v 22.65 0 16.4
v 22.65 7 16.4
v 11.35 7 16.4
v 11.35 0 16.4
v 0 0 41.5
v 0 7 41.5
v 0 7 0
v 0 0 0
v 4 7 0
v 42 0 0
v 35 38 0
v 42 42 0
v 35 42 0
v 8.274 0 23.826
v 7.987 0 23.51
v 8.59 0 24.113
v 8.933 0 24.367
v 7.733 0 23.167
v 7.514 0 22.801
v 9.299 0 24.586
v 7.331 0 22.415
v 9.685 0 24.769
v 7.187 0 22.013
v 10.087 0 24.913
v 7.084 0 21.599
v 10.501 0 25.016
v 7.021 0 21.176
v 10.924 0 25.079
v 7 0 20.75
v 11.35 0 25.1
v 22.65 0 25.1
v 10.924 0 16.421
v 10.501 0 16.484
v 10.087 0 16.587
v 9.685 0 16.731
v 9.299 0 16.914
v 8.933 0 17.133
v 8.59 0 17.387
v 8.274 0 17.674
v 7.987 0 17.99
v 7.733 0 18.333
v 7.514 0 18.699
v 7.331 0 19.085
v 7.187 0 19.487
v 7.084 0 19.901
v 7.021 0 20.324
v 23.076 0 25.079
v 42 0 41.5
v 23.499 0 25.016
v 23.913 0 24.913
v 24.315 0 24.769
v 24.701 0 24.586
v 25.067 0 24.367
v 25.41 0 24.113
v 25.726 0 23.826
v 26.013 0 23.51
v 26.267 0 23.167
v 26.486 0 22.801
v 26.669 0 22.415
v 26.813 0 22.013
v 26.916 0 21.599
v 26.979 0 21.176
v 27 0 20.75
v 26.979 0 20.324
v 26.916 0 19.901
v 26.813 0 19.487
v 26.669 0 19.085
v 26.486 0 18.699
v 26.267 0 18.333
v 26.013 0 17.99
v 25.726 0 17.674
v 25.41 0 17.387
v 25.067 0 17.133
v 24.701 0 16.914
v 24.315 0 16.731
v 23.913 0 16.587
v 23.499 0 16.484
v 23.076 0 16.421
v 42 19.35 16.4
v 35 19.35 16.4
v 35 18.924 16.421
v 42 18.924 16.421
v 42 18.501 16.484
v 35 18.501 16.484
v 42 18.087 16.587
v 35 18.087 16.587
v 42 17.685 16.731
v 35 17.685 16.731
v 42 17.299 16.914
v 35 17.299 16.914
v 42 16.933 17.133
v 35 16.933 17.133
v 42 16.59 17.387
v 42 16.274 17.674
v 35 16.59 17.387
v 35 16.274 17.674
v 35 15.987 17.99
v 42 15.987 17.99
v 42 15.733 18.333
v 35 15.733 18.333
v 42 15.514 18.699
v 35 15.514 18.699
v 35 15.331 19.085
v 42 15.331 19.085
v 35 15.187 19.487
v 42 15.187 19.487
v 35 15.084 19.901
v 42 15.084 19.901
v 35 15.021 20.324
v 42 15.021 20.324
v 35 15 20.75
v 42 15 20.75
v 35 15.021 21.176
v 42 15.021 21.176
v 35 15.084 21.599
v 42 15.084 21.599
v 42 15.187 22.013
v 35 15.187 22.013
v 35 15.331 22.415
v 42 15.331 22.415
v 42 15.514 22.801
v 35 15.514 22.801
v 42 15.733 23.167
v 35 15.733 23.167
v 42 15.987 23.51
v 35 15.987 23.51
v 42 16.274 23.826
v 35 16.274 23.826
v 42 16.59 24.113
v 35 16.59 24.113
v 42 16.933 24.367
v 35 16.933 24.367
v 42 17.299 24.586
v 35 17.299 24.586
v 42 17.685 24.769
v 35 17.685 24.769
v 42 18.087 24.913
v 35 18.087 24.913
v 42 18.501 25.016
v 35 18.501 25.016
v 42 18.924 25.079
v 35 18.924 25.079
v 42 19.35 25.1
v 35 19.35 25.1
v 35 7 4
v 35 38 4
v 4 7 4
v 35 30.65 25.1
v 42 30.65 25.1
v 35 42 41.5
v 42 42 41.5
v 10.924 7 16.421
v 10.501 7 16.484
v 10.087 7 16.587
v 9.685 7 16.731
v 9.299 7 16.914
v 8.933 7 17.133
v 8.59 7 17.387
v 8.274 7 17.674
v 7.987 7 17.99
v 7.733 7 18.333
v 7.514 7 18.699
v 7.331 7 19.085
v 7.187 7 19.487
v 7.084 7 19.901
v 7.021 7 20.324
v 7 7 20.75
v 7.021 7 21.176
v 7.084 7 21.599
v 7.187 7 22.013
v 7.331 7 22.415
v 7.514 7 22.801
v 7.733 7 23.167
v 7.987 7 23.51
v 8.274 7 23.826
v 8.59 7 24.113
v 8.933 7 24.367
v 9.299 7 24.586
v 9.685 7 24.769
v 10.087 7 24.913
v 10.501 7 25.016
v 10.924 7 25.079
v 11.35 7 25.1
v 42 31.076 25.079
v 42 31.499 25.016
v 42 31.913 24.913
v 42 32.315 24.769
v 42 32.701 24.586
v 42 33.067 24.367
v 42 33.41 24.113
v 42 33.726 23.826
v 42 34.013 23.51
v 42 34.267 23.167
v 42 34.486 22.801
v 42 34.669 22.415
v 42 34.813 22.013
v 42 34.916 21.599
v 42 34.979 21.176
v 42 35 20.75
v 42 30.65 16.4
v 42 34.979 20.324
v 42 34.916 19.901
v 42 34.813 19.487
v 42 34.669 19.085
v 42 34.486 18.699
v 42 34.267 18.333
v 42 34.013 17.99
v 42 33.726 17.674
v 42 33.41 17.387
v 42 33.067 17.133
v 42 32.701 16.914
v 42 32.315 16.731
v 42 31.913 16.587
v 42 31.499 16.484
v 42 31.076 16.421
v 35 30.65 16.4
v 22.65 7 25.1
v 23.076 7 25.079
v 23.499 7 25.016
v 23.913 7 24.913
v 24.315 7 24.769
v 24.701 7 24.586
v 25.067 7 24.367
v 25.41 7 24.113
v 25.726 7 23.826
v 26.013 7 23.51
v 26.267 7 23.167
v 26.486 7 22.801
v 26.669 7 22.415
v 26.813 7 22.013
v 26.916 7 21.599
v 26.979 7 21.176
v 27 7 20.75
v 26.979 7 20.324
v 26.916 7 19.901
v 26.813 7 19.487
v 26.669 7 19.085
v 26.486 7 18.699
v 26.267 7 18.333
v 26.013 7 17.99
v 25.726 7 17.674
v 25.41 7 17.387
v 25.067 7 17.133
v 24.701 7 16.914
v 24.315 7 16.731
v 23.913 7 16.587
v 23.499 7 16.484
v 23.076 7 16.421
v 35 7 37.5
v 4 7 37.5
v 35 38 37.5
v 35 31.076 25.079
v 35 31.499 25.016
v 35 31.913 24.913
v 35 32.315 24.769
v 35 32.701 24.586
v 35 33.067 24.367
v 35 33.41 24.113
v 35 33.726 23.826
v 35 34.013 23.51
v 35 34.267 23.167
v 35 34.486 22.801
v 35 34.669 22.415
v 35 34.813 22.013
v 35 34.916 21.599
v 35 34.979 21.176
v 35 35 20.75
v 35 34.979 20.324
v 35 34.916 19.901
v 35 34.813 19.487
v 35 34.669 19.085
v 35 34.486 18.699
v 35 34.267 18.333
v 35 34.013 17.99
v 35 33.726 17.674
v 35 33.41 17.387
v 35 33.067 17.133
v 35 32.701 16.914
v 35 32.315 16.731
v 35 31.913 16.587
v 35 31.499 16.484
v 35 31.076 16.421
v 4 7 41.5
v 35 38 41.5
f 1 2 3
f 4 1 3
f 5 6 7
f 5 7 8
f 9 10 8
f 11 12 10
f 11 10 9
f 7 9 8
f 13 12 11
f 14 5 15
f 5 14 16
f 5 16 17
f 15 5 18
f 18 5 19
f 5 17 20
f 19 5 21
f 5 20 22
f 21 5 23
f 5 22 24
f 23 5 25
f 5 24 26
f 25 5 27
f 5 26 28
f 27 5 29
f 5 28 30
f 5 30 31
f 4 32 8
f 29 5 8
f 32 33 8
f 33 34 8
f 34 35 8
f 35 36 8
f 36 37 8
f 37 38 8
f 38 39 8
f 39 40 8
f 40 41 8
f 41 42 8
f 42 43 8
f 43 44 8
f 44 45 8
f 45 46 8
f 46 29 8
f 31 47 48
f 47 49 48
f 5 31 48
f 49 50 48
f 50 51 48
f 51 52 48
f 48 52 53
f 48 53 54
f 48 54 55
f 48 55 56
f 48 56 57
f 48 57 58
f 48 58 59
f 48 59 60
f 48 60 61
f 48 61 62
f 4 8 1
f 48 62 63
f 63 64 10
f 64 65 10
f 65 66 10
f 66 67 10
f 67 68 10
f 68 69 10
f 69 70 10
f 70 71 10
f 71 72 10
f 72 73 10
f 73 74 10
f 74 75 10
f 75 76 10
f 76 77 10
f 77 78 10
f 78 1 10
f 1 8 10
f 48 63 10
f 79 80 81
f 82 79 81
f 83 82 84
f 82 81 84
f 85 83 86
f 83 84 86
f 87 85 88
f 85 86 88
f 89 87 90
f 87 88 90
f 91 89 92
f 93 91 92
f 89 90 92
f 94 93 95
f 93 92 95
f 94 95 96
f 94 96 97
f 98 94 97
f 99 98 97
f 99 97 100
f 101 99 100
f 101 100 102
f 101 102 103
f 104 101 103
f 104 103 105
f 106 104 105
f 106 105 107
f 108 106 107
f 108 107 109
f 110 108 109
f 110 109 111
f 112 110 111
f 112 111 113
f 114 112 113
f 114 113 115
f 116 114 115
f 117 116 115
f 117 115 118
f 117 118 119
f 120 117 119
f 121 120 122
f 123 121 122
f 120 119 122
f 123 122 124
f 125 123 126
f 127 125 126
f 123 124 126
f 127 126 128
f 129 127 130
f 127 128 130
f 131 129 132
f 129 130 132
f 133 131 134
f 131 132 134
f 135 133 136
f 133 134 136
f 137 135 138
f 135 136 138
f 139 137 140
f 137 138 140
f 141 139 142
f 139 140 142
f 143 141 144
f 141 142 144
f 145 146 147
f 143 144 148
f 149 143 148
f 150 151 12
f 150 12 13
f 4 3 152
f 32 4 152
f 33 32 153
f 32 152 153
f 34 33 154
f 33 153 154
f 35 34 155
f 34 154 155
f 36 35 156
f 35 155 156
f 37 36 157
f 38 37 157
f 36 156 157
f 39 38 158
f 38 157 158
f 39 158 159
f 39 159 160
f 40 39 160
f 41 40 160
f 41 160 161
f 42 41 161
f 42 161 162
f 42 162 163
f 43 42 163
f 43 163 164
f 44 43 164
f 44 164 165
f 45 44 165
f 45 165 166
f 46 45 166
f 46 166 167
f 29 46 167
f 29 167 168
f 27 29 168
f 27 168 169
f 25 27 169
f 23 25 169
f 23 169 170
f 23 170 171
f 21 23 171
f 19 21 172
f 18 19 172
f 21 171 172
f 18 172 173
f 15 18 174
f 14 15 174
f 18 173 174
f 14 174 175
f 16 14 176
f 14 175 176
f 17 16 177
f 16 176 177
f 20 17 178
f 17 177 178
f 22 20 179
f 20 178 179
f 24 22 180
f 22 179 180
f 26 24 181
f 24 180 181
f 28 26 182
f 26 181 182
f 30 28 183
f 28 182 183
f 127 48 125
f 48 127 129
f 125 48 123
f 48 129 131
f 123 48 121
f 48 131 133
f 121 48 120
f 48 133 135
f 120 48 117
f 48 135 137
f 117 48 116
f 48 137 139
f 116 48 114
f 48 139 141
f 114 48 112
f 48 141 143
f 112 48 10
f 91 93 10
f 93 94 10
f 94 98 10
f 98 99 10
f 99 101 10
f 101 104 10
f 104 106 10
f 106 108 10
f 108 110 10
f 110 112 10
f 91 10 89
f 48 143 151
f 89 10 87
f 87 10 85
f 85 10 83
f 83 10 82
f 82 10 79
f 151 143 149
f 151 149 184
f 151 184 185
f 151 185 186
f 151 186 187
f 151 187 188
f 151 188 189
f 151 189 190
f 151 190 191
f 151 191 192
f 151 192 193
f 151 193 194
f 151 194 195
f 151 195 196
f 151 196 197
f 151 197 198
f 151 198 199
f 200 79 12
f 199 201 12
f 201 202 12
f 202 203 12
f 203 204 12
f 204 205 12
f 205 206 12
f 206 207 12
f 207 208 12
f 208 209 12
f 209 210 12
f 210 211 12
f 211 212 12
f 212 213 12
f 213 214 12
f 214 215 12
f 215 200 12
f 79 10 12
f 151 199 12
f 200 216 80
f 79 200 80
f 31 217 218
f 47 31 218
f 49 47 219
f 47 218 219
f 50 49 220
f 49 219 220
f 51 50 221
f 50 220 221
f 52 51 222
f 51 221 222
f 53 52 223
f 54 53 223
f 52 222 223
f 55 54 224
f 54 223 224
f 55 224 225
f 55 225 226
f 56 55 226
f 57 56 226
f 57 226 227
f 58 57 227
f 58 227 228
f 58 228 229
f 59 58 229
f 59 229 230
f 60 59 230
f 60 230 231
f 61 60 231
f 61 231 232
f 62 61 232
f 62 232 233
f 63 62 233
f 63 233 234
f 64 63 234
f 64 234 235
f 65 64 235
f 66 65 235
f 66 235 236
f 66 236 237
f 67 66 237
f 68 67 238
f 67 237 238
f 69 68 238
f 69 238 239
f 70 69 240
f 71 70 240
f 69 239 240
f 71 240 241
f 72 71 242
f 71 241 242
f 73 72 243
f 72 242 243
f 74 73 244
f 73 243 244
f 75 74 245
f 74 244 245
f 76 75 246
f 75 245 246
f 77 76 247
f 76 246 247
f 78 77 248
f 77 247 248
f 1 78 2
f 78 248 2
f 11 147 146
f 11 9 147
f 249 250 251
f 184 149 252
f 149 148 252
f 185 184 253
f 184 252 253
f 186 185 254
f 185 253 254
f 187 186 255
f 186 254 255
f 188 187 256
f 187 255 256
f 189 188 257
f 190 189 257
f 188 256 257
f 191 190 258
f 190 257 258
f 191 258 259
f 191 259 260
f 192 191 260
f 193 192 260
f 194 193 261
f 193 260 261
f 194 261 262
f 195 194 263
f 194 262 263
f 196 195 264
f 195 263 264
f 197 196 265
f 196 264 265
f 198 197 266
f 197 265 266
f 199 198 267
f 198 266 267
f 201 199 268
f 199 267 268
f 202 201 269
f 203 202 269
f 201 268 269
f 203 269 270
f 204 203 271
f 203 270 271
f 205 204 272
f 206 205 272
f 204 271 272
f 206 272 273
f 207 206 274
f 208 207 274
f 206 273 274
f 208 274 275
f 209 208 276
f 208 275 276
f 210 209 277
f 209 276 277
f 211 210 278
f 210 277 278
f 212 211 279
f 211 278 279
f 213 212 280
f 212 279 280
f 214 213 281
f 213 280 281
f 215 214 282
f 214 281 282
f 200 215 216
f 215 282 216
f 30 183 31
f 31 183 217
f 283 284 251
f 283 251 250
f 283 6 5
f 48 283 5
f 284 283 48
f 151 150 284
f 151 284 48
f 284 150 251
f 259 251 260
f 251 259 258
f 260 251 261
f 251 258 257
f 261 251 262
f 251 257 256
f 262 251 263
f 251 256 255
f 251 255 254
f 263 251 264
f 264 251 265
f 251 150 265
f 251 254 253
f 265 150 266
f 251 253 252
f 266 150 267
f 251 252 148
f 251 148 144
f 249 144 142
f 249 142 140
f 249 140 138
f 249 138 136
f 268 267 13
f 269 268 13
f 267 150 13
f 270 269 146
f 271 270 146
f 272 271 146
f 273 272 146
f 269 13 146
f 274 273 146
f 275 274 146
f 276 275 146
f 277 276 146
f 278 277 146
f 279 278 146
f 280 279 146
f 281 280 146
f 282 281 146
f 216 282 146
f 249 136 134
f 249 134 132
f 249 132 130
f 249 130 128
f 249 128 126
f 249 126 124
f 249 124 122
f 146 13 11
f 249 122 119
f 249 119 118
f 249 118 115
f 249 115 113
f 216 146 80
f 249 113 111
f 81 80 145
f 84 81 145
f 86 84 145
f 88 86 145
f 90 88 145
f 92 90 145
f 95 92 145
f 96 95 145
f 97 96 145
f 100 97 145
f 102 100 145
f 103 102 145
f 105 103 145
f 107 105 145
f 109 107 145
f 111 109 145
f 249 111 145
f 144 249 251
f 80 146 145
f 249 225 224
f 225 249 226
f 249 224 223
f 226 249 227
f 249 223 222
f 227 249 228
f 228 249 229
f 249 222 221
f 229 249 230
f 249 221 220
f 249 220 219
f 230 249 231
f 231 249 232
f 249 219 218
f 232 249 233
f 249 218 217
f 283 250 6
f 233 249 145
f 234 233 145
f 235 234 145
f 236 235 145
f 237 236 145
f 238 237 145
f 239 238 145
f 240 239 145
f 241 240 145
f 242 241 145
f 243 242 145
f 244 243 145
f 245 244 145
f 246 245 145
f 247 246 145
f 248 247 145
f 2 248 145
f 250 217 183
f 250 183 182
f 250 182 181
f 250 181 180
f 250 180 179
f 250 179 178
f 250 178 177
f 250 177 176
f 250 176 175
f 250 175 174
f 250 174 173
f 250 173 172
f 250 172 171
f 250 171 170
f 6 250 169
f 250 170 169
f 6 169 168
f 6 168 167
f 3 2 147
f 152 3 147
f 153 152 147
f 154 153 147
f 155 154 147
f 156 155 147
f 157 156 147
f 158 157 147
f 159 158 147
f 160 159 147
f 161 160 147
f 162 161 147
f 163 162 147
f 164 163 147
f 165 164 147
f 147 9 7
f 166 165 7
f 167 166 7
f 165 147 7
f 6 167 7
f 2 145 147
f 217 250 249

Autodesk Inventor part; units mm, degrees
ref_plane "YZ Plane" through (0, 0, 0) normal (1, 0, 0) x (0, 1, 0)
ref_plane "XZ Plane" through (0, 0, 0) normal (0, 1, 0) x (-1, 0, 0)
ref_plane "XY Plane" through (0, 0, 0) normal (0, 0, 1) x (1, 0, 0)
sketch "Boceto1" plane through (0, 0, 0) normal (0, 0, 1) x (1, 0, 0)
  line L0 (0, 0) -> (42, 0)
  line L1 (42, 0) -> (42, 42)
  line L2 (42, 42) -> (35, 42)
  line L3 (35, 42) -> (35, 7)
  line L4 (35, 7) -> (0, 7)
  line L5 (0, 7) -> (0, 0)
  dimension "d0" = 7
  dimension "d1" = 7
  dimension "d2" = 42
  dimension "d3" = 42
extrude "Extrusión1" add sketch "Boceto1" along normal blind 41.5
sketch "Boceto2" plane through (0, 0, 41.5) normal (0, 0, 1) x (1, 0, 0)
  line L0 (35, 7) -> (0, 7) projected
  line L1 (35, 7) -> (35, 38)
  line L2 (35, 42) -> (35, 7) projected
  line L3 (35, 38) -> (4, 7)
  line L4 (4, 7) -> (35, 7)
  line L5 (42, 42) -> (35, 42) projected
  point P0 (0, 0)
  point P1 (4, 7)
  dimension "d6" = 4
  dimension "d7" = 4
extrude "Extrusión2" add sketch "Boceto2" against normal blind 4
sketch "Boceto3" plane through (0, 0, 0) normal (0, 0, -1) x (-1, 0, 0)
  line L0 (-4, 7) -> (-35, 38) projected
  line L1 (-35, 42) -> (-35, 7) projected
  line L2 (-35, 7) -> (0, 7) projected
  point P0 (0, 0)
extrude "Extrusión3" add sketch "Boceto3" against normal blind 4
sketch "Boceto4" plane through (35, 42, 0) normal (-1, 0, 0) x (0, 0, 1)
  line L0 (20.75, -11.35) -> (20.75, -22.65) construction
  line L1 (16.4, -11.35) -> (16.4, -22.65)
  line L2 (25.1, -22.65) -> (25.1, -11.35)
  arc A0 (25.1, -11.35) -> (16.4, -11.35) centre (20.75, -11.35) ccw
  arc A1 (16.4, -22.65) -> (25.1, -22.65) centre (20.75, -22.65) ccw
  line L3 (0, 0) -> (41.5, 0) projected
  point P0 (0, -42)
  point P1 (20.75, -17)
  point P2 (20.75, 0)
  point P3 (20.75, -27)
  point P4 (20.75, -7)
  dimension "d12" = 8.7
  dimension "d13" = 20
  dimension "d14" = 7
extrude "Extrusión4" cut sketch "Boceto4" against normal through all
sketch "Boceto5" plane through (0, 7, 41.5) normal (0, 1, 0) x (1, 0, 0)
  line L0 (22.65, 20.75) -> (11.35, 20.75) construction
  line L1 (22.65, 25.1) -> (11.35, 25.1)
  line L2 (11.35, 16.4) -> (22.65, 16.4)
  arc A0 (22.65, 16.4) -> (22.65, 25.1) centre (22.65, 20.75) ccw
  arc A1 (11.35, 25.1) -> (11.35, 16.4) centre (11.35, 20.75) ccw
  line L3 (0, 41.5) -> (0, 0) projected
  point P0 (17, 20.75)
  point P1 (0, 20.75)
  point P2 (27, 20.75)
  point P3 (7, 20.75)
  dimension "d17" = 20
  dimension "d18" = 7
  dimension "d19" = 8.7
extrude "Extrusión5" cut sketch "Boceto5" against normal blind 10
properties part number "escuadra pequeña"
